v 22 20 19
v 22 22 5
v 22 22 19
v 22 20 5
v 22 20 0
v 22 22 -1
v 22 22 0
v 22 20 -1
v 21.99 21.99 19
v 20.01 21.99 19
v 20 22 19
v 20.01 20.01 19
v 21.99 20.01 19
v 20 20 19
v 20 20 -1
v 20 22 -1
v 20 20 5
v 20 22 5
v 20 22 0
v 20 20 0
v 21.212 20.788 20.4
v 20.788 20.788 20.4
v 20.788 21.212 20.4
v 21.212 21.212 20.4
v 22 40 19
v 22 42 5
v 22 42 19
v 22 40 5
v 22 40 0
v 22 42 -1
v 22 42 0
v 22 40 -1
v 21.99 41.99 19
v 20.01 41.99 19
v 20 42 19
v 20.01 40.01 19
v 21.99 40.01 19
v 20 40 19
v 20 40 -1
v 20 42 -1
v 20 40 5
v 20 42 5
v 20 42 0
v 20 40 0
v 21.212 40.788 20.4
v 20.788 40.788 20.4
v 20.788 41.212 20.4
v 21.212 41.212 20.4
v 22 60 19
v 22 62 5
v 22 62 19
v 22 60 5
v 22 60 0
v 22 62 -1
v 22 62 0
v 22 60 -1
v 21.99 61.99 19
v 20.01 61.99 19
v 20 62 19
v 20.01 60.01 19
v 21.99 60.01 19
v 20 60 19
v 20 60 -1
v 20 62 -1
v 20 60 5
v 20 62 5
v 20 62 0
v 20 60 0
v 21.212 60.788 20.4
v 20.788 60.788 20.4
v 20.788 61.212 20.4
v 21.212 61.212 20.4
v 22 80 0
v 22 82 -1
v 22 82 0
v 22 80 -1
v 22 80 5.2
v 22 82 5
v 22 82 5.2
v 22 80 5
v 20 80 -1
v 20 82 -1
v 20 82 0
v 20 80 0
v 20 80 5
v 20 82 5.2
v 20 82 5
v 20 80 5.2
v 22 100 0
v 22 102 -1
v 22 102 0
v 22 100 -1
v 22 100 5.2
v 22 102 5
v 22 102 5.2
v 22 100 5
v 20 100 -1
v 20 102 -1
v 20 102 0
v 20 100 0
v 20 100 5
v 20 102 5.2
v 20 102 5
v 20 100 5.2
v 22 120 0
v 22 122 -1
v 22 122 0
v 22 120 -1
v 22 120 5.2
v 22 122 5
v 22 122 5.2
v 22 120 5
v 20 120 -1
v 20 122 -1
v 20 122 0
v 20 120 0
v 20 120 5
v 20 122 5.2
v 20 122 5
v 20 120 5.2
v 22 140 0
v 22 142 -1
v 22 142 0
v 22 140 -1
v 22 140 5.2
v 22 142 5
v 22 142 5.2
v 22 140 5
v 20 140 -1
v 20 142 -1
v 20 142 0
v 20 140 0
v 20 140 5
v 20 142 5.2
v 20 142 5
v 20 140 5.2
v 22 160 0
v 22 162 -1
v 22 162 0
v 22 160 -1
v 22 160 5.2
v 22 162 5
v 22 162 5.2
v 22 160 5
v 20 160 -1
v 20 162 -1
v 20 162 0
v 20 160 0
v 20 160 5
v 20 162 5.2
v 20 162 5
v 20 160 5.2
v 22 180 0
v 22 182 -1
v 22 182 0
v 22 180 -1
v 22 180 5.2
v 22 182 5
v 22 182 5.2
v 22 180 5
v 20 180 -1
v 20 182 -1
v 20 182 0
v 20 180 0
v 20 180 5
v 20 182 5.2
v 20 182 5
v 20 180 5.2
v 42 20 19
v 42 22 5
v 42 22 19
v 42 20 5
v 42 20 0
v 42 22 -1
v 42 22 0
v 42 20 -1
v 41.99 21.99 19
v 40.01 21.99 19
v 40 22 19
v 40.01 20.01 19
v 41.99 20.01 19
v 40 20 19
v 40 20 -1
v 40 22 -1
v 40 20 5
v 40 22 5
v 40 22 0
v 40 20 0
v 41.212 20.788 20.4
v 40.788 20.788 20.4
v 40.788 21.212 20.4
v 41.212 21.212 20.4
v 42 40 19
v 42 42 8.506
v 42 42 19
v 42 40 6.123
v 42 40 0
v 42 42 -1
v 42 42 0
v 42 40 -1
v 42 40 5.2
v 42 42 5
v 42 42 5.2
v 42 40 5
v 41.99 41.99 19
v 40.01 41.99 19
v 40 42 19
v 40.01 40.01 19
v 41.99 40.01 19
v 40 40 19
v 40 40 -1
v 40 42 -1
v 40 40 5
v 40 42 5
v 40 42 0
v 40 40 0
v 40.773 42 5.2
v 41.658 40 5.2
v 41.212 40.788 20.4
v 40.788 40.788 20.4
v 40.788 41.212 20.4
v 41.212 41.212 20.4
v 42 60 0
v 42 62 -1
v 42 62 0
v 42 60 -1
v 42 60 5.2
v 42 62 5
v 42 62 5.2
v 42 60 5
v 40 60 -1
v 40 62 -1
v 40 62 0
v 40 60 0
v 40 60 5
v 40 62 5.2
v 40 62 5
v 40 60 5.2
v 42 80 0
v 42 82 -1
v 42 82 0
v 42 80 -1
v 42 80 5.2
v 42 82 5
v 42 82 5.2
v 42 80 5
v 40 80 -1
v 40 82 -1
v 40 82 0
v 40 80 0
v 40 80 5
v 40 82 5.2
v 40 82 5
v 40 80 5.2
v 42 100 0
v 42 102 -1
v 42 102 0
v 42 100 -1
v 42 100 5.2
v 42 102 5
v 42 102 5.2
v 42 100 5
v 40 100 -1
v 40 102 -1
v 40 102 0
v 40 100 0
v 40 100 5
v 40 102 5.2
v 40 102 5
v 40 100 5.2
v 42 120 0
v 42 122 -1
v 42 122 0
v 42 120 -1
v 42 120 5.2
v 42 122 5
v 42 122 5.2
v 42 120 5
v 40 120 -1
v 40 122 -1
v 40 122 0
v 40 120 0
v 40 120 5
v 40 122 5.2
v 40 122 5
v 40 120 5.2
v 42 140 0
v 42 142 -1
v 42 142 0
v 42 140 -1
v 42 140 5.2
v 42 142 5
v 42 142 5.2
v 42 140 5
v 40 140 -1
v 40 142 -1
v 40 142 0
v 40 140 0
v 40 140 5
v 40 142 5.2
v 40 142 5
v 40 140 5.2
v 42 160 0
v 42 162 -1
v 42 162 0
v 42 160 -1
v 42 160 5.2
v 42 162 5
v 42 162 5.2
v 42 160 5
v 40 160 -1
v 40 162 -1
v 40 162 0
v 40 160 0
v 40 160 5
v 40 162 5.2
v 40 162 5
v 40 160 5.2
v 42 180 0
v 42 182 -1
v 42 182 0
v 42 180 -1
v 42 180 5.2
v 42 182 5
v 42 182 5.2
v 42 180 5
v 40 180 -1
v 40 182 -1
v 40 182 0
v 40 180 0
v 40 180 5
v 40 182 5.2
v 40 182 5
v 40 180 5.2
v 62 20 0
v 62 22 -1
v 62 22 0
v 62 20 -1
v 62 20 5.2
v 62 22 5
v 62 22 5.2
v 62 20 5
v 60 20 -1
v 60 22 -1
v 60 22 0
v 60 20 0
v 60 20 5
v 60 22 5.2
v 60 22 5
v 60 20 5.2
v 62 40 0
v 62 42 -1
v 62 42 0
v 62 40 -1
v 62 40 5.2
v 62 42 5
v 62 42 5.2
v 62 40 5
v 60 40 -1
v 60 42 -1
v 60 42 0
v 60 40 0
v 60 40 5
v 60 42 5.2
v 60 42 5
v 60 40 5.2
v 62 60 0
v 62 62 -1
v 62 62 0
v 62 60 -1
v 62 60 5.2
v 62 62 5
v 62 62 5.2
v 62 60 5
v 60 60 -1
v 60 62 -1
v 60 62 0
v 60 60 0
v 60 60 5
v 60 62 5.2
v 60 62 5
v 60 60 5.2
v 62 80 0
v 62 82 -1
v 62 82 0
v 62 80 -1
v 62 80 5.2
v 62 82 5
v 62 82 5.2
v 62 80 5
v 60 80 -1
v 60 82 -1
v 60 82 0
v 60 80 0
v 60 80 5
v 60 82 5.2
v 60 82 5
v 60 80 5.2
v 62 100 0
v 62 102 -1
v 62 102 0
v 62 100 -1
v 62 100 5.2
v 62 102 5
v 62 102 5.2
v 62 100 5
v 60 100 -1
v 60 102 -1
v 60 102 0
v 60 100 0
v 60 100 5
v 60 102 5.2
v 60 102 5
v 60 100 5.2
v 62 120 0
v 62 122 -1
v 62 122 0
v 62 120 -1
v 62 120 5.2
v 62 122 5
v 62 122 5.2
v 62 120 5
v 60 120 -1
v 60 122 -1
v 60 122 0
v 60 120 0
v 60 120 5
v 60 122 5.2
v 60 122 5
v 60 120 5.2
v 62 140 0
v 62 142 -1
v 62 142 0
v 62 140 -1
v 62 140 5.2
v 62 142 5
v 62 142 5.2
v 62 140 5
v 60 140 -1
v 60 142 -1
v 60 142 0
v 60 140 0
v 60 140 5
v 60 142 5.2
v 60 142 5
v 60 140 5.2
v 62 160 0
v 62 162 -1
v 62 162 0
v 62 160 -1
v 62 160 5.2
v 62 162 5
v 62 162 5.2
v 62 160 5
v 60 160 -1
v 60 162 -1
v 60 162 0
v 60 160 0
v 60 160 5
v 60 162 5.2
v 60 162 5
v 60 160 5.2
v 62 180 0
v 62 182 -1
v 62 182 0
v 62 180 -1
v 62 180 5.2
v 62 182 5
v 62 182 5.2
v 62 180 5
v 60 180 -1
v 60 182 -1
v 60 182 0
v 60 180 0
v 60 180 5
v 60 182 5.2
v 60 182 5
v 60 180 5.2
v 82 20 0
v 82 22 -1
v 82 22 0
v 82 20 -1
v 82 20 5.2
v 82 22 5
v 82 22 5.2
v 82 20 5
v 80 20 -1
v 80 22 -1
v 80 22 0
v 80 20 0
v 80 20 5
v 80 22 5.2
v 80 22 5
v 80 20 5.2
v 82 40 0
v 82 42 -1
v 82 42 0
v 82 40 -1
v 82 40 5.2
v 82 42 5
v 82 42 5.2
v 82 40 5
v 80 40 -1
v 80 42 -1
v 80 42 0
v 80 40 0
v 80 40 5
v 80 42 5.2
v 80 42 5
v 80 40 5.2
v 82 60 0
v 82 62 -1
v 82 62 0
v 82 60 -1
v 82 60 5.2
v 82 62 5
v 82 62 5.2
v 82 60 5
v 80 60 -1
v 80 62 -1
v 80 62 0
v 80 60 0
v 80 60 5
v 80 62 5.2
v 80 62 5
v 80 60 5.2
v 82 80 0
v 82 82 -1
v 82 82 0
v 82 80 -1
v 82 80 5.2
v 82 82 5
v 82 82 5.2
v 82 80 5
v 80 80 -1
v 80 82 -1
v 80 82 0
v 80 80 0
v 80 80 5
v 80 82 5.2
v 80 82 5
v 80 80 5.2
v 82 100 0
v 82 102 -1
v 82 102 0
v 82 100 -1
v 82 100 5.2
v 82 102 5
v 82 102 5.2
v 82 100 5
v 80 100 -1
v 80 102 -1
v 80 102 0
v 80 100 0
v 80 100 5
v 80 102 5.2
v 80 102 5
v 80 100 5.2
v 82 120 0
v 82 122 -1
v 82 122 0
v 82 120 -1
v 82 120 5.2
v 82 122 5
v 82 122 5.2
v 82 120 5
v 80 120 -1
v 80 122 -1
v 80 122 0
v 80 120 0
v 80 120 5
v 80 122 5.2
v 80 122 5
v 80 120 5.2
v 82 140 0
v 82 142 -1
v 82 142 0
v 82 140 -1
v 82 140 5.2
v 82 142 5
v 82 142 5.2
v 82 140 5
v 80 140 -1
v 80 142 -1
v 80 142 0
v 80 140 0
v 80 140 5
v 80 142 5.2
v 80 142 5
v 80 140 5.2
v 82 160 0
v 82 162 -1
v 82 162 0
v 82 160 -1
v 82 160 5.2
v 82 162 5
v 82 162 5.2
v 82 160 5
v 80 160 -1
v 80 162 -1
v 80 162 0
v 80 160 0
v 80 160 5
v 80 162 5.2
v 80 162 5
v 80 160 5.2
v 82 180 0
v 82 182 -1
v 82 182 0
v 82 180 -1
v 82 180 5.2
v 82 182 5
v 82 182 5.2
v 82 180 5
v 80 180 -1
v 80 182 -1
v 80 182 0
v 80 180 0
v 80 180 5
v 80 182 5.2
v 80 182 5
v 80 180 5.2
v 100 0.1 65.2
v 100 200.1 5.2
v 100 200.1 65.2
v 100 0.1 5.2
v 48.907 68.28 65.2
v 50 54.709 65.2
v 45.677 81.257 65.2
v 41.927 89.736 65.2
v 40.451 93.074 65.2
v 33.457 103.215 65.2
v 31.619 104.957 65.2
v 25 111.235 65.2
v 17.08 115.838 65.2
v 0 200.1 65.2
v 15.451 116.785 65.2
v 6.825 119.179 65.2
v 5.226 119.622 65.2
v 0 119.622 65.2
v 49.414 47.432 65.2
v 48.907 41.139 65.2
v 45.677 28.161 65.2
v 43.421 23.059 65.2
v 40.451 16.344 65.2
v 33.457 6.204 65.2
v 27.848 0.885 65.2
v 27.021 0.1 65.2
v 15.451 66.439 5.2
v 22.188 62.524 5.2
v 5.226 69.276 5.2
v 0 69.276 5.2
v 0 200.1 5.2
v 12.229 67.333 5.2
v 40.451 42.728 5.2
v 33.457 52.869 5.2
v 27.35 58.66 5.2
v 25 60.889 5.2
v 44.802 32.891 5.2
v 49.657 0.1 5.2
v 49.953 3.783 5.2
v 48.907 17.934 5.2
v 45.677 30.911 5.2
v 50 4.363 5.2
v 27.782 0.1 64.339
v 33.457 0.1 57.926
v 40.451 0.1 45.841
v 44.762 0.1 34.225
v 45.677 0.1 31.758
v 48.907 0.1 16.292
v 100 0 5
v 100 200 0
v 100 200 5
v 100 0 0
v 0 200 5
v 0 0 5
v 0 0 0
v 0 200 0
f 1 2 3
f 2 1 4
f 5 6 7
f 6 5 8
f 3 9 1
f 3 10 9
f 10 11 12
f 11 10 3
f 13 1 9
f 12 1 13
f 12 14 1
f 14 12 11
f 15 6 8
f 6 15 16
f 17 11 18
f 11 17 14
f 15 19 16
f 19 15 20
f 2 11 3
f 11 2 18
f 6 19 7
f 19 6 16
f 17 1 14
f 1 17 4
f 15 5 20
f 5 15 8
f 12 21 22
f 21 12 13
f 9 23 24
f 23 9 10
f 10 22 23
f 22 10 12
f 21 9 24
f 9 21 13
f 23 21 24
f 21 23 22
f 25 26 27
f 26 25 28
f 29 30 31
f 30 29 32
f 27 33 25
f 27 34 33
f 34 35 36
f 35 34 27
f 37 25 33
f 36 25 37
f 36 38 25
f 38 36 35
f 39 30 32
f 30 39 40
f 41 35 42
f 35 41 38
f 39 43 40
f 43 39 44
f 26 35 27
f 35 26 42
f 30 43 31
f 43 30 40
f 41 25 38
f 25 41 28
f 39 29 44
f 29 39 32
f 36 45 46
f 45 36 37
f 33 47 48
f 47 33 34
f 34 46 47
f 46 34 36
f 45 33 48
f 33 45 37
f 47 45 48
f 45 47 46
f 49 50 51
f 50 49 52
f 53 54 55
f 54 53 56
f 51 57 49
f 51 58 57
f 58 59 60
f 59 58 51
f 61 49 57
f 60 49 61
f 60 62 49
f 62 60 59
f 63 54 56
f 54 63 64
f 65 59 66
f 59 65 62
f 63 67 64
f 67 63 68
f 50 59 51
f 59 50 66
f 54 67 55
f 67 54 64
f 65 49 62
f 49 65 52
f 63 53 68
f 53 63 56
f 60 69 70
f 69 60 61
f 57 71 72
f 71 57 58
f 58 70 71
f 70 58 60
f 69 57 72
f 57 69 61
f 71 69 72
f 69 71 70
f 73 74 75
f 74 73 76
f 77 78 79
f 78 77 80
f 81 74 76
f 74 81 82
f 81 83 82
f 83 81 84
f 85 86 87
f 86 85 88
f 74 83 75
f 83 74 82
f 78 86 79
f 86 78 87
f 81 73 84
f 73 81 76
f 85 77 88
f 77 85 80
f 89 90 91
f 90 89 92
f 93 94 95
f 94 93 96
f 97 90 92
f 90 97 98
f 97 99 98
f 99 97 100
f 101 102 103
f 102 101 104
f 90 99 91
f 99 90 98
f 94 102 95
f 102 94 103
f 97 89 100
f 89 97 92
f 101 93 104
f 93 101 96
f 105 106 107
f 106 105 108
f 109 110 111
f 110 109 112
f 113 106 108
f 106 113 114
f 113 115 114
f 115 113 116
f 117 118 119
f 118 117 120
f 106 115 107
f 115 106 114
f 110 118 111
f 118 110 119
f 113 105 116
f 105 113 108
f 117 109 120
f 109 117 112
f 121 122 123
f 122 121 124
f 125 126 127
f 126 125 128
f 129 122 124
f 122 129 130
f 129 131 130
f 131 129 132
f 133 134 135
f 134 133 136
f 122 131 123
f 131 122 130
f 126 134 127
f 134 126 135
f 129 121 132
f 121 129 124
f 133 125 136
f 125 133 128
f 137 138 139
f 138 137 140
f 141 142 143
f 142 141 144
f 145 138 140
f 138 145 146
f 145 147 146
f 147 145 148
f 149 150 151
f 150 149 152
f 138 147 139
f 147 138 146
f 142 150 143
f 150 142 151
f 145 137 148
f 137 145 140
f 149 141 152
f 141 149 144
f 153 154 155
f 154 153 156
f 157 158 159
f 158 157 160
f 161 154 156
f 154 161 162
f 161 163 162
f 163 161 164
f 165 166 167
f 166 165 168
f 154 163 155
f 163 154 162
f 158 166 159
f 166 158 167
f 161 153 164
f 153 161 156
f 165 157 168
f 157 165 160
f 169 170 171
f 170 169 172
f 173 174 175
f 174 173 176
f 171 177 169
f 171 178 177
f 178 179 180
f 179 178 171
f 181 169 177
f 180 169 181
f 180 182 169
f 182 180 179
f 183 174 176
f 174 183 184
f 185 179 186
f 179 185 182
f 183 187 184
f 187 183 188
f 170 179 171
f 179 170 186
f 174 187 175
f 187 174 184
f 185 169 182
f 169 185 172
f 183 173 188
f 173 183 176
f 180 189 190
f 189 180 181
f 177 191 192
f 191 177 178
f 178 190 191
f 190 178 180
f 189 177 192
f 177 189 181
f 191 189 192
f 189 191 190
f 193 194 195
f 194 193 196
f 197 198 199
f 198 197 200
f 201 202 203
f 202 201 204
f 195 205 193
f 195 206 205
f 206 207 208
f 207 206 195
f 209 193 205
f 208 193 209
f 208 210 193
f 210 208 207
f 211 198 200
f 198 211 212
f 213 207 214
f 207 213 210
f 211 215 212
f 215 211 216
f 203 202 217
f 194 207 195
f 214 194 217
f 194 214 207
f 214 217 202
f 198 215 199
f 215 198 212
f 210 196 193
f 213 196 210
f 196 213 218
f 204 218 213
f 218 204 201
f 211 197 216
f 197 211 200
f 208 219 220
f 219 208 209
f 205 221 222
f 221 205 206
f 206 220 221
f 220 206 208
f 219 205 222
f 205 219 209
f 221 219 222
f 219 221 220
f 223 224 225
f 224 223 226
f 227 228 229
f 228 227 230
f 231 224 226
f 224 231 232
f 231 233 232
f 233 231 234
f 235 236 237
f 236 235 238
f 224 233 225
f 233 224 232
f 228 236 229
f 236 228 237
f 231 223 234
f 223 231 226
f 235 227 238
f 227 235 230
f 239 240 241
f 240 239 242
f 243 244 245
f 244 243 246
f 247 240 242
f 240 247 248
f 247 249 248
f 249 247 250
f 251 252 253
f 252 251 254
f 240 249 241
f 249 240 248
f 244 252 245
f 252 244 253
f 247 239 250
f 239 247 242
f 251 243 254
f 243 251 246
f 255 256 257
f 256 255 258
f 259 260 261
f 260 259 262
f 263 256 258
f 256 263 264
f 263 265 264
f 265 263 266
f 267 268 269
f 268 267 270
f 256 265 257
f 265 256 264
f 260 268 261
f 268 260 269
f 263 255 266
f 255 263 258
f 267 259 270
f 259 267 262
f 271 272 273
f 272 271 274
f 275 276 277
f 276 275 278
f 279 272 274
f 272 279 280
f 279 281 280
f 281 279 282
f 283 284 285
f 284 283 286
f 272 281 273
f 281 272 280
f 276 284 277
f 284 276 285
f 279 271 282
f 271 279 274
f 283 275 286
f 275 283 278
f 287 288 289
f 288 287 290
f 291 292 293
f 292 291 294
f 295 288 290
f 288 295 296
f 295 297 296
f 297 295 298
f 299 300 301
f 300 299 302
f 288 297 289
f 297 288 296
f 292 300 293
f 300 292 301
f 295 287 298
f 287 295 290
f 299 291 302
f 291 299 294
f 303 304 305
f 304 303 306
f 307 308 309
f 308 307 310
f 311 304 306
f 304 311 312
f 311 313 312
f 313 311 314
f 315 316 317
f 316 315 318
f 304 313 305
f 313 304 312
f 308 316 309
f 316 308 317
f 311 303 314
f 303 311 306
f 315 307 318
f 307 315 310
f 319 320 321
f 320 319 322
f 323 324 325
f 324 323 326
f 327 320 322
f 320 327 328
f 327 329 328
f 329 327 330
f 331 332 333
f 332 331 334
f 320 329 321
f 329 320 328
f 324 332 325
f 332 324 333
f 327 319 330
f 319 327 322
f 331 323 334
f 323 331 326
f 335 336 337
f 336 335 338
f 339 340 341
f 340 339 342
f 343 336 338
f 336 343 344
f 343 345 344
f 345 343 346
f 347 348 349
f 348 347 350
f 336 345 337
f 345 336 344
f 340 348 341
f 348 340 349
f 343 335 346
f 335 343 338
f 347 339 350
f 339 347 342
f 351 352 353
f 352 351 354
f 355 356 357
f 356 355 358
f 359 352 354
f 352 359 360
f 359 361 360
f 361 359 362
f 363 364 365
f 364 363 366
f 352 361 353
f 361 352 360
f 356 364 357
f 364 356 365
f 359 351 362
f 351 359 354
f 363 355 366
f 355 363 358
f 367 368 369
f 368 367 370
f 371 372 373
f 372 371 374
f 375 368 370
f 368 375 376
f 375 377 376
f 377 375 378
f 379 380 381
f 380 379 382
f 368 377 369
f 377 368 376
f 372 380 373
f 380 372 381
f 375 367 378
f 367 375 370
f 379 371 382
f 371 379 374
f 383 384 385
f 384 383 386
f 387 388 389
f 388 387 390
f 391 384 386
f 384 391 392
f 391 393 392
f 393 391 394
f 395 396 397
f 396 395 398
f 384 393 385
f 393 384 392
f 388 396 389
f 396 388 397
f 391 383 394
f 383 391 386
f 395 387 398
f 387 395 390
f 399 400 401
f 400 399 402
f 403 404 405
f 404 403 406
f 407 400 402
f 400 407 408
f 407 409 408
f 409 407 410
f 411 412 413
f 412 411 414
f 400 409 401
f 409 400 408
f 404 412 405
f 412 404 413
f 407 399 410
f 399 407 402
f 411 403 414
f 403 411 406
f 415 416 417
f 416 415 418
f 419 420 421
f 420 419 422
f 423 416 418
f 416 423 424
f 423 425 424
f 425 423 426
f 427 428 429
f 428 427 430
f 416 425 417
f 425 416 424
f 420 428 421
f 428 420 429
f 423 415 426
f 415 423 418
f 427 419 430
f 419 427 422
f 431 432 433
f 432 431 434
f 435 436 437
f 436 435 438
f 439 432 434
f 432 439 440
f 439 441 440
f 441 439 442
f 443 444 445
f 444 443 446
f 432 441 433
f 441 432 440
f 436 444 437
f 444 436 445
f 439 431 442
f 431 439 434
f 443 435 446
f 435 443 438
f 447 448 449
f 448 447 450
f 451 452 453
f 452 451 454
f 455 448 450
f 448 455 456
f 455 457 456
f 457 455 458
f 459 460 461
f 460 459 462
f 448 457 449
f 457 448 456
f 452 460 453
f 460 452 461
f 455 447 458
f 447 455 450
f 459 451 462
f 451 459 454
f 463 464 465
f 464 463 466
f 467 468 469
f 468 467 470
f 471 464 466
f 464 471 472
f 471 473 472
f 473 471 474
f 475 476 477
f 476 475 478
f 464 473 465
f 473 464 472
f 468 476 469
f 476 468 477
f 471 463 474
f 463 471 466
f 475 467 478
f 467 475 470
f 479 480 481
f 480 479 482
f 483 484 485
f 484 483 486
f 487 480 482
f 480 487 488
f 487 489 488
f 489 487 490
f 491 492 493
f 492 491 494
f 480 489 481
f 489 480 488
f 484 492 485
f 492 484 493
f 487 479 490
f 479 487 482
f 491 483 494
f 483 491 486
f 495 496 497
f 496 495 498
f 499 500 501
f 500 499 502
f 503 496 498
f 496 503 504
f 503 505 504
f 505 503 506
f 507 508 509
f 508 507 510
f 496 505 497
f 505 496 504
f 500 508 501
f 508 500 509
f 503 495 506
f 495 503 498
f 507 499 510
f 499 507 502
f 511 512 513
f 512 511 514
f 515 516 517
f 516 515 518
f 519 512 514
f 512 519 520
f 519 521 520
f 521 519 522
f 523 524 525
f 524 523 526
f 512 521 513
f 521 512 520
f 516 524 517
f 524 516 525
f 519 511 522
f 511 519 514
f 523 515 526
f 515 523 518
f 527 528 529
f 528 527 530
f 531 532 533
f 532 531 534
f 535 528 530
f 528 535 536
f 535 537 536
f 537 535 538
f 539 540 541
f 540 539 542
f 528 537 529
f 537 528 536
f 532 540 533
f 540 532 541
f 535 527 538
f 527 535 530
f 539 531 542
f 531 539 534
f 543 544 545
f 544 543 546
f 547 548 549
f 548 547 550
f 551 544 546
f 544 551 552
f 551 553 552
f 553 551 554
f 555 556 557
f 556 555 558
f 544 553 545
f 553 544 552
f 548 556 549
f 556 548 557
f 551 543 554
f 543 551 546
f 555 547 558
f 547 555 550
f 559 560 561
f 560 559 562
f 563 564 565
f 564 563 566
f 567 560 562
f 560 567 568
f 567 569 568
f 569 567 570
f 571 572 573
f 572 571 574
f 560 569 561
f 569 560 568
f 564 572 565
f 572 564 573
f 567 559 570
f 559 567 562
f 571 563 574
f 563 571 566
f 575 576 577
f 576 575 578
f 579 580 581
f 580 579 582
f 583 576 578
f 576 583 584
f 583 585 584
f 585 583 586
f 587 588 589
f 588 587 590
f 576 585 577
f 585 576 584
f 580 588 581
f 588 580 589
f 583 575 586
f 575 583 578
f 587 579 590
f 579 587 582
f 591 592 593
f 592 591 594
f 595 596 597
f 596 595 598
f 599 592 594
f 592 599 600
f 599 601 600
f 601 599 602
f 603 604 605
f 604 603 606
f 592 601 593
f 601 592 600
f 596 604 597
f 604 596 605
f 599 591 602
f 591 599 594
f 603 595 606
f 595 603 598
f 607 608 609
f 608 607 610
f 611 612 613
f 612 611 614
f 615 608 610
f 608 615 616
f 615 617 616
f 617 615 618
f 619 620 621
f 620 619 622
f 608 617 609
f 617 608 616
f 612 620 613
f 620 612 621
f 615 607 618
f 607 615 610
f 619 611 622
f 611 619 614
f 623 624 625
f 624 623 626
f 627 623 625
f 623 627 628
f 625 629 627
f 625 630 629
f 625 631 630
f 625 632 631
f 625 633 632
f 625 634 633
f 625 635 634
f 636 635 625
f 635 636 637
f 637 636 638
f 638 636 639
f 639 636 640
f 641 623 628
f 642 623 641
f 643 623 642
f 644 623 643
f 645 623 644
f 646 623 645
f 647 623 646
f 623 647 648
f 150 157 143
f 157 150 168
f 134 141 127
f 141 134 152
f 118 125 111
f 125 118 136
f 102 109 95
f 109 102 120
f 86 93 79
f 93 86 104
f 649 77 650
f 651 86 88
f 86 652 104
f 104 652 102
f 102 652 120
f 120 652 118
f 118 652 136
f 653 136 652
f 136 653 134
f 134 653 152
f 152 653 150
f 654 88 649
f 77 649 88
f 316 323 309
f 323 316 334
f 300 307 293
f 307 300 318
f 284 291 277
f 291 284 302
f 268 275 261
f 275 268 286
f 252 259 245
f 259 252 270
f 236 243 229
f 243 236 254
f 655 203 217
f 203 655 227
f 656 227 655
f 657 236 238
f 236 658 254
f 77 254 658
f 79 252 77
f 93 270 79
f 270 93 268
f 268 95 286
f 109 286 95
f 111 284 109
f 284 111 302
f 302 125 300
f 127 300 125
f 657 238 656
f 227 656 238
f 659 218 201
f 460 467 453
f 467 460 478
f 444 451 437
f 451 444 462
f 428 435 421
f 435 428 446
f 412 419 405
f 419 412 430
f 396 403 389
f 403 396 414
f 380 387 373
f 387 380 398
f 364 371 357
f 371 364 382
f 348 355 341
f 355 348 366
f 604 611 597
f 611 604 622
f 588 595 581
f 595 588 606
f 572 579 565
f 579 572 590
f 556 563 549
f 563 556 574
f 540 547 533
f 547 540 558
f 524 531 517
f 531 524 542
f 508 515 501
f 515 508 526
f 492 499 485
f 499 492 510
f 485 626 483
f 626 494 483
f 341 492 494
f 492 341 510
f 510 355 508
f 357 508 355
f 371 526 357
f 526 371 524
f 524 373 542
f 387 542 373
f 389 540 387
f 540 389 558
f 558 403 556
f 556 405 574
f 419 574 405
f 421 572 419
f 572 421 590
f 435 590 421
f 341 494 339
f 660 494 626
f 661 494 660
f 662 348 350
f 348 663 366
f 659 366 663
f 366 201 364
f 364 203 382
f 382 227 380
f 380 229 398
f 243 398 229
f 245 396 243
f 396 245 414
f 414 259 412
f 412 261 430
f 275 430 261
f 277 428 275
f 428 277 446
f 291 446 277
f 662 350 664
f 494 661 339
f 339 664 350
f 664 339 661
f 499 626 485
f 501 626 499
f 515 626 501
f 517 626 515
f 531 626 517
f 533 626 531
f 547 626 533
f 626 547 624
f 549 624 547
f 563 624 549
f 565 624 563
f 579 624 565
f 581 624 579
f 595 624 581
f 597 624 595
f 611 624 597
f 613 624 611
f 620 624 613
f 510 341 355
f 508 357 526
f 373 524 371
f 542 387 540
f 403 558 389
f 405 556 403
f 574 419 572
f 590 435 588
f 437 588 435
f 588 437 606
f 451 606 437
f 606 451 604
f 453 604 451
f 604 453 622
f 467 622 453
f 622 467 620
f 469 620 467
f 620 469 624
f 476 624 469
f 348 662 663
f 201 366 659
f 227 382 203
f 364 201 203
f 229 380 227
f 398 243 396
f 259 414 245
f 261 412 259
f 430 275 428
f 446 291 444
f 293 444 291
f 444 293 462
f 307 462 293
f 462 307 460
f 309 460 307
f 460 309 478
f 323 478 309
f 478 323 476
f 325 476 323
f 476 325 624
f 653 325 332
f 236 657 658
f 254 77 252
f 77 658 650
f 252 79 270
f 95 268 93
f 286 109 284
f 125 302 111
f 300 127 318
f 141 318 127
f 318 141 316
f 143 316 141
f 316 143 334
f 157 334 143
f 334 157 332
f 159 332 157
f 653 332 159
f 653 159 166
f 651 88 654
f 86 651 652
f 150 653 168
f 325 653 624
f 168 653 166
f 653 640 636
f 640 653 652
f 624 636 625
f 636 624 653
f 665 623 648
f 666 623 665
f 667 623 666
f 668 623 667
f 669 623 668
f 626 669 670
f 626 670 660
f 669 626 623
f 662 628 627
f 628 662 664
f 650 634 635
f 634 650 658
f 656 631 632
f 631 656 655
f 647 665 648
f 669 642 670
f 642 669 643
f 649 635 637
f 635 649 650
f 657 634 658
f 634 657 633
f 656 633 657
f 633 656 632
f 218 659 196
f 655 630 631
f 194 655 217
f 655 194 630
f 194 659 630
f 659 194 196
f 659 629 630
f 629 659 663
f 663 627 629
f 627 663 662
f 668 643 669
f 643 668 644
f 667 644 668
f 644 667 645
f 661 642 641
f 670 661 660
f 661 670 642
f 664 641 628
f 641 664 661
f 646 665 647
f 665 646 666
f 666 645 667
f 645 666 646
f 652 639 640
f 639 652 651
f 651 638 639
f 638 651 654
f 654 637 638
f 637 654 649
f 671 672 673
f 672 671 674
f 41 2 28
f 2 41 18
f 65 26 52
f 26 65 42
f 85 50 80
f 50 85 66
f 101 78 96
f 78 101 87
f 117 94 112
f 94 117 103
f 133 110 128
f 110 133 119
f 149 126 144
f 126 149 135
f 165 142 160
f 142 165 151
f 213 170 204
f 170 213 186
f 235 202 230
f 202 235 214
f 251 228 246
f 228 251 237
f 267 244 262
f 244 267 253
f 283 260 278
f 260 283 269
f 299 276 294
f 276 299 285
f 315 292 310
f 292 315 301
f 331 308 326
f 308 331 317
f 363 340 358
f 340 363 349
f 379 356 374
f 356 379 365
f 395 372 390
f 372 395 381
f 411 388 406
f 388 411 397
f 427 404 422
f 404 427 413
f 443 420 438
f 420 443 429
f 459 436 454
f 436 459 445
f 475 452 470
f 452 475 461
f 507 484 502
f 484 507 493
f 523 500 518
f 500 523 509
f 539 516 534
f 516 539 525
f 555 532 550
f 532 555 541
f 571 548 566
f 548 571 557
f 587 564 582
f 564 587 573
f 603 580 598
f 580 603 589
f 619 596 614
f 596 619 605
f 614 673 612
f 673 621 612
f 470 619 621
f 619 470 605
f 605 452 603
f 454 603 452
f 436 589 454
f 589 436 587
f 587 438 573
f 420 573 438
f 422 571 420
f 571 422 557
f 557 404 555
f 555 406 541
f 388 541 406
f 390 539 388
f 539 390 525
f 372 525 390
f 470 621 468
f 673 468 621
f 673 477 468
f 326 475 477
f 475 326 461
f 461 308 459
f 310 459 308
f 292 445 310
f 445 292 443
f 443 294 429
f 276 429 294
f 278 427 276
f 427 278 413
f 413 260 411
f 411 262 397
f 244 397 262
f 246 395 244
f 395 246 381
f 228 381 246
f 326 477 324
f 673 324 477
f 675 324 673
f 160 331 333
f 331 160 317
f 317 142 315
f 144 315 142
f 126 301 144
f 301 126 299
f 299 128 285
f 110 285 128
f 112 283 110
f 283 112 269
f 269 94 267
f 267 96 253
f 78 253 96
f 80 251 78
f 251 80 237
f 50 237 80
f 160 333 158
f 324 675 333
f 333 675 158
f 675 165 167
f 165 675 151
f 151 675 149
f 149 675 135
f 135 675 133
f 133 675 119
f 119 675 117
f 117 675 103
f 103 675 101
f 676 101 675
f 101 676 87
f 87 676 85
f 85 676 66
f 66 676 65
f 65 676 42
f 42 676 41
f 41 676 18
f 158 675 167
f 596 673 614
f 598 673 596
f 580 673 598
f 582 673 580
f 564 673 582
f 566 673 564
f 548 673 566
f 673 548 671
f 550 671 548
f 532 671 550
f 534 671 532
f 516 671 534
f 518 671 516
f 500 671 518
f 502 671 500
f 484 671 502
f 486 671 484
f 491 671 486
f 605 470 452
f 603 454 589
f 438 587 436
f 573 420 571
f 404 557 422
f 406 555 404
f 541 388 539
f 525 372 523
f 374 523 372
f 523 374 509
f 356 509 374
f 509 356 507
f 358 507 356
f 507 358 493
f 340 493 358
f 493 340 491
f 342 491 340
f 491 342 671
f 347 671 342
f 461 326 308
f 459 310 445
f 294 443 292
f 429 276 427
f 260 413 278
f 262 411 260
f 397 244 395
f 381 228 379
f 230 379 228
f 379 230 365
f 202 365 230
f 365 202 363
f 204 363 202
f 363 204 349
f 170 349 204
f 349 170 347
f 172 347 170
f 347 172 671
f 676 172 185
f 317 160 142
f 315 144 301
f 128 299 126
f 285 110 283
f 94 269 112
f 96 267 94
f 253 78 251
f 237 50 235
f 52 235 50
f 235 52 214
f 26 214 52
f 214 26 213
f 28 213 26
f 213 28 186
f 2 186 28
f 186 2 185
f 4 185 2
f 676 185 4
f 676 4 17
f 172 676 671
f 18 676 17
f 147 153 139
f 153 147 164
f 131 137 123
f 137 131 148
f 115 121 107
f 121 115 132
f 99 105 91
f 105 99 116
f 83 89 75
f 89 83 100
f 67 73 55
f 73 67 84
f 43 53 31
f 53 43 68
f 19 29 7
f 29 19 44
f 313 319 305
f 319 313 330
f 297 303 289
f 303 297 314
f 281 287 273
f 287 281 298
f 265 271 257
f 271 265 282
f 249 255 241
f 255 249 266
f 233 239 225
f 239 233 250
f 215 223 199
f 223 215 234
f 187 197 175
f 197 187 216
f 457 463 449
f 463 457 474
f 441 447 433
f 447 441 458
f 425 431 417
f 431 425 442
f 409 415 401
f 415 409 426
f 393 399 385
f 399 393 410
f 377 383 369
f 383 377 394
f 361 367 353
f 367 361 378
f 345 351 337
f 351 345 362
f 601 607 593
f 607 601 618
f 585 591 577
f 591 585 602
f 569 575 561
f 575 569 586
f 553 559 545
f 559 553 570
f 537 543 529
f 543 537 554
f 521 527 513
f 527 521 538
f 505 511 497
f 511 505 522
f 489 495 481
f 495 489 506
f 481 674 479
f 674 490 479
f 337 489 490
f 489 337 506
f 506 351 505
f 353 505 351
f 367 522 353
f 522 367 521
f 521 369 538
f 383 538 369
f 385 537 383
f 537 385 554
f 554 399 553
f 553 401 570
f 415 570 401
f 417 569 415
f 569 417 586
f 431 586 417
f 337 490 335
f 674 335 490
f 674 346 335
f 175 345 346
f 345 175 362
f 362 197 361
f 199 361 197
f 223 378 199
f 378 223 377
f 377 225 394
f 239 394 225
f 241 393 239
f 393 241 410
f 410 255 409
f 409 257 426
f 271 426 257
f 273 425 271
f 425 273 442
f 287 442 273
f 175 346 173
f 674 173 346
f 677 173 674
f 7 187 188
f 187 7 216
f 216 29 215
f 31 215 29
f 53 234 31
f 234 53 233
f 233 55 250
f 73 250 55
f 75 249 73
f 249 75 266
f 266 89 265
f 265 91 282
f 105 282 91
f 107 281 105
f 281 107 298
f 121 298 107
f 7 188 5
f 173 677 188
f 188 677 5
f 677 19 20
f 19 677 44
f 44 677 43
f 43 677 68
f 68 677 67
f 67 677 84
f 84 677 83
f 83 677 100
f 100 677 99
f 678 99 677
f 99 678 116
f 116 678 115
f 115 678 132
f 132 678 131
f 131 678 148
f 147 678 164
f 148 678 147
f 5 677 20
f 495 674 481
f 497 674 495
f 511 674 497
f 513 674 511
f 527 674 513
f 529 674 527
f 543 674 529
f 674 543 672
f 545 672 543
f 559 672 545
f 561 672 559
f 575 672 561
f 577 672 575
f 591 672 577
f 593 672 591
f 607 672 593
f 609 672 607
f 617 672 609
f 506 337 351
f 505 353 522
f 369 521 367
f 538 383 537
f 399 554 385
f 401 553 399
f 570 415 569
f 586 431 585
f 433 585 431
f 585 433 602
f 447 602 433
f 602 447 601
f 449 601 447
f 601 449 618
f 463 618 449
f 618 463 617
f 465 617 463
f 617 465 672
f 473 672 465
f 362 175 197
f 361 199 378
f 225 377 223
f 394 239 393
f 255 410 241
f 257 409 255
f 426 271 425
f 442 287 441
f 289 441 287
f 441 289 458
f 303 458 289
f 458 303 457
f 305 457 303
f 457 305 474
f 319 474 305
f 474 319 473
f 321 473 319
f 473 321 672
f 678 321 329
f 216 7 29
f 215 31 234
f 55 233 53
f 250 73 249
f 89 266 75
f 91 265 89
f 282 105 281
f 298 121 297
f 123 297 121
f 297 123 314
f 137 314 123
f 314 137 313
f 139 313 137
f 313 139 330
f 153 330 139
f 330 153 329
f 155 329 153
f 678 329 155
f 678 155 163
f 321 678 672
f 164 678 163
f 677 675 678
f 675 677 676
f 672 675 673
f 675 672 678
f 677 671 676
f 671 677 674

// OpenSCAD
width=2;
length=8;
pcb_size = [100,200,5];
color_pcb = "Green";
color_pin = "Gold";
color_esd = "DarkSlateGray";
eds_pad_hole = 100;


translate([20,20,-1])
spike_grid(3,8,20);
color(color_pcb,1.0)
    cube(pcb_size, false);

difference()
{
    translate([0,0.1,5.2])
        esd_pad(100,200,60,eds_pad_hole);
    color("DarkSlateGray",1.0)
        rotate([-40,0,0])
        cylinder(h=150,r=50);
}

module esd_pad(width,length,height,divider)
{
    xr = rands(0,width,width/divider);
    yr = rands(0,length,length/divider);
    zr = rands(0,height,height/divider);
    color("DarkSlateGray",1.0)
    difference()
    {
        cube([width,length,height]);
        for(xi = xr)
        {
            for(yi = yr)
            {
                for(zi = zr)
                {
                    r = rands(1.0,5,1);
                    translate([xi,yi,zi])
                        sphere(r=r[0],$fn = 8);
                }
            }
        }
    }

}

module spike_grid(x_count,y_count, spacing)
{
    for(xi = [0 : spacing : spacing*x_count])
    {
        for(yi = [0 : spacing : spacing*y_count])
        {
            translate([xi,yi,0])
                spike(2,40);
        }
    }
}



module spike(width,length)
{
    pin_scale = width*0.7;
    top_separator = 2;
    color(color_pin,1.0)
        cube([width,width,length/top_separator],false);
        translate([width/2,width/2,length/top_separator])
            rotate(45)
                {
                    color(color_pin,1.0)
                        cylinder(pin_scale,pin_scale,0.3, false, $fn=4);
                }
}
